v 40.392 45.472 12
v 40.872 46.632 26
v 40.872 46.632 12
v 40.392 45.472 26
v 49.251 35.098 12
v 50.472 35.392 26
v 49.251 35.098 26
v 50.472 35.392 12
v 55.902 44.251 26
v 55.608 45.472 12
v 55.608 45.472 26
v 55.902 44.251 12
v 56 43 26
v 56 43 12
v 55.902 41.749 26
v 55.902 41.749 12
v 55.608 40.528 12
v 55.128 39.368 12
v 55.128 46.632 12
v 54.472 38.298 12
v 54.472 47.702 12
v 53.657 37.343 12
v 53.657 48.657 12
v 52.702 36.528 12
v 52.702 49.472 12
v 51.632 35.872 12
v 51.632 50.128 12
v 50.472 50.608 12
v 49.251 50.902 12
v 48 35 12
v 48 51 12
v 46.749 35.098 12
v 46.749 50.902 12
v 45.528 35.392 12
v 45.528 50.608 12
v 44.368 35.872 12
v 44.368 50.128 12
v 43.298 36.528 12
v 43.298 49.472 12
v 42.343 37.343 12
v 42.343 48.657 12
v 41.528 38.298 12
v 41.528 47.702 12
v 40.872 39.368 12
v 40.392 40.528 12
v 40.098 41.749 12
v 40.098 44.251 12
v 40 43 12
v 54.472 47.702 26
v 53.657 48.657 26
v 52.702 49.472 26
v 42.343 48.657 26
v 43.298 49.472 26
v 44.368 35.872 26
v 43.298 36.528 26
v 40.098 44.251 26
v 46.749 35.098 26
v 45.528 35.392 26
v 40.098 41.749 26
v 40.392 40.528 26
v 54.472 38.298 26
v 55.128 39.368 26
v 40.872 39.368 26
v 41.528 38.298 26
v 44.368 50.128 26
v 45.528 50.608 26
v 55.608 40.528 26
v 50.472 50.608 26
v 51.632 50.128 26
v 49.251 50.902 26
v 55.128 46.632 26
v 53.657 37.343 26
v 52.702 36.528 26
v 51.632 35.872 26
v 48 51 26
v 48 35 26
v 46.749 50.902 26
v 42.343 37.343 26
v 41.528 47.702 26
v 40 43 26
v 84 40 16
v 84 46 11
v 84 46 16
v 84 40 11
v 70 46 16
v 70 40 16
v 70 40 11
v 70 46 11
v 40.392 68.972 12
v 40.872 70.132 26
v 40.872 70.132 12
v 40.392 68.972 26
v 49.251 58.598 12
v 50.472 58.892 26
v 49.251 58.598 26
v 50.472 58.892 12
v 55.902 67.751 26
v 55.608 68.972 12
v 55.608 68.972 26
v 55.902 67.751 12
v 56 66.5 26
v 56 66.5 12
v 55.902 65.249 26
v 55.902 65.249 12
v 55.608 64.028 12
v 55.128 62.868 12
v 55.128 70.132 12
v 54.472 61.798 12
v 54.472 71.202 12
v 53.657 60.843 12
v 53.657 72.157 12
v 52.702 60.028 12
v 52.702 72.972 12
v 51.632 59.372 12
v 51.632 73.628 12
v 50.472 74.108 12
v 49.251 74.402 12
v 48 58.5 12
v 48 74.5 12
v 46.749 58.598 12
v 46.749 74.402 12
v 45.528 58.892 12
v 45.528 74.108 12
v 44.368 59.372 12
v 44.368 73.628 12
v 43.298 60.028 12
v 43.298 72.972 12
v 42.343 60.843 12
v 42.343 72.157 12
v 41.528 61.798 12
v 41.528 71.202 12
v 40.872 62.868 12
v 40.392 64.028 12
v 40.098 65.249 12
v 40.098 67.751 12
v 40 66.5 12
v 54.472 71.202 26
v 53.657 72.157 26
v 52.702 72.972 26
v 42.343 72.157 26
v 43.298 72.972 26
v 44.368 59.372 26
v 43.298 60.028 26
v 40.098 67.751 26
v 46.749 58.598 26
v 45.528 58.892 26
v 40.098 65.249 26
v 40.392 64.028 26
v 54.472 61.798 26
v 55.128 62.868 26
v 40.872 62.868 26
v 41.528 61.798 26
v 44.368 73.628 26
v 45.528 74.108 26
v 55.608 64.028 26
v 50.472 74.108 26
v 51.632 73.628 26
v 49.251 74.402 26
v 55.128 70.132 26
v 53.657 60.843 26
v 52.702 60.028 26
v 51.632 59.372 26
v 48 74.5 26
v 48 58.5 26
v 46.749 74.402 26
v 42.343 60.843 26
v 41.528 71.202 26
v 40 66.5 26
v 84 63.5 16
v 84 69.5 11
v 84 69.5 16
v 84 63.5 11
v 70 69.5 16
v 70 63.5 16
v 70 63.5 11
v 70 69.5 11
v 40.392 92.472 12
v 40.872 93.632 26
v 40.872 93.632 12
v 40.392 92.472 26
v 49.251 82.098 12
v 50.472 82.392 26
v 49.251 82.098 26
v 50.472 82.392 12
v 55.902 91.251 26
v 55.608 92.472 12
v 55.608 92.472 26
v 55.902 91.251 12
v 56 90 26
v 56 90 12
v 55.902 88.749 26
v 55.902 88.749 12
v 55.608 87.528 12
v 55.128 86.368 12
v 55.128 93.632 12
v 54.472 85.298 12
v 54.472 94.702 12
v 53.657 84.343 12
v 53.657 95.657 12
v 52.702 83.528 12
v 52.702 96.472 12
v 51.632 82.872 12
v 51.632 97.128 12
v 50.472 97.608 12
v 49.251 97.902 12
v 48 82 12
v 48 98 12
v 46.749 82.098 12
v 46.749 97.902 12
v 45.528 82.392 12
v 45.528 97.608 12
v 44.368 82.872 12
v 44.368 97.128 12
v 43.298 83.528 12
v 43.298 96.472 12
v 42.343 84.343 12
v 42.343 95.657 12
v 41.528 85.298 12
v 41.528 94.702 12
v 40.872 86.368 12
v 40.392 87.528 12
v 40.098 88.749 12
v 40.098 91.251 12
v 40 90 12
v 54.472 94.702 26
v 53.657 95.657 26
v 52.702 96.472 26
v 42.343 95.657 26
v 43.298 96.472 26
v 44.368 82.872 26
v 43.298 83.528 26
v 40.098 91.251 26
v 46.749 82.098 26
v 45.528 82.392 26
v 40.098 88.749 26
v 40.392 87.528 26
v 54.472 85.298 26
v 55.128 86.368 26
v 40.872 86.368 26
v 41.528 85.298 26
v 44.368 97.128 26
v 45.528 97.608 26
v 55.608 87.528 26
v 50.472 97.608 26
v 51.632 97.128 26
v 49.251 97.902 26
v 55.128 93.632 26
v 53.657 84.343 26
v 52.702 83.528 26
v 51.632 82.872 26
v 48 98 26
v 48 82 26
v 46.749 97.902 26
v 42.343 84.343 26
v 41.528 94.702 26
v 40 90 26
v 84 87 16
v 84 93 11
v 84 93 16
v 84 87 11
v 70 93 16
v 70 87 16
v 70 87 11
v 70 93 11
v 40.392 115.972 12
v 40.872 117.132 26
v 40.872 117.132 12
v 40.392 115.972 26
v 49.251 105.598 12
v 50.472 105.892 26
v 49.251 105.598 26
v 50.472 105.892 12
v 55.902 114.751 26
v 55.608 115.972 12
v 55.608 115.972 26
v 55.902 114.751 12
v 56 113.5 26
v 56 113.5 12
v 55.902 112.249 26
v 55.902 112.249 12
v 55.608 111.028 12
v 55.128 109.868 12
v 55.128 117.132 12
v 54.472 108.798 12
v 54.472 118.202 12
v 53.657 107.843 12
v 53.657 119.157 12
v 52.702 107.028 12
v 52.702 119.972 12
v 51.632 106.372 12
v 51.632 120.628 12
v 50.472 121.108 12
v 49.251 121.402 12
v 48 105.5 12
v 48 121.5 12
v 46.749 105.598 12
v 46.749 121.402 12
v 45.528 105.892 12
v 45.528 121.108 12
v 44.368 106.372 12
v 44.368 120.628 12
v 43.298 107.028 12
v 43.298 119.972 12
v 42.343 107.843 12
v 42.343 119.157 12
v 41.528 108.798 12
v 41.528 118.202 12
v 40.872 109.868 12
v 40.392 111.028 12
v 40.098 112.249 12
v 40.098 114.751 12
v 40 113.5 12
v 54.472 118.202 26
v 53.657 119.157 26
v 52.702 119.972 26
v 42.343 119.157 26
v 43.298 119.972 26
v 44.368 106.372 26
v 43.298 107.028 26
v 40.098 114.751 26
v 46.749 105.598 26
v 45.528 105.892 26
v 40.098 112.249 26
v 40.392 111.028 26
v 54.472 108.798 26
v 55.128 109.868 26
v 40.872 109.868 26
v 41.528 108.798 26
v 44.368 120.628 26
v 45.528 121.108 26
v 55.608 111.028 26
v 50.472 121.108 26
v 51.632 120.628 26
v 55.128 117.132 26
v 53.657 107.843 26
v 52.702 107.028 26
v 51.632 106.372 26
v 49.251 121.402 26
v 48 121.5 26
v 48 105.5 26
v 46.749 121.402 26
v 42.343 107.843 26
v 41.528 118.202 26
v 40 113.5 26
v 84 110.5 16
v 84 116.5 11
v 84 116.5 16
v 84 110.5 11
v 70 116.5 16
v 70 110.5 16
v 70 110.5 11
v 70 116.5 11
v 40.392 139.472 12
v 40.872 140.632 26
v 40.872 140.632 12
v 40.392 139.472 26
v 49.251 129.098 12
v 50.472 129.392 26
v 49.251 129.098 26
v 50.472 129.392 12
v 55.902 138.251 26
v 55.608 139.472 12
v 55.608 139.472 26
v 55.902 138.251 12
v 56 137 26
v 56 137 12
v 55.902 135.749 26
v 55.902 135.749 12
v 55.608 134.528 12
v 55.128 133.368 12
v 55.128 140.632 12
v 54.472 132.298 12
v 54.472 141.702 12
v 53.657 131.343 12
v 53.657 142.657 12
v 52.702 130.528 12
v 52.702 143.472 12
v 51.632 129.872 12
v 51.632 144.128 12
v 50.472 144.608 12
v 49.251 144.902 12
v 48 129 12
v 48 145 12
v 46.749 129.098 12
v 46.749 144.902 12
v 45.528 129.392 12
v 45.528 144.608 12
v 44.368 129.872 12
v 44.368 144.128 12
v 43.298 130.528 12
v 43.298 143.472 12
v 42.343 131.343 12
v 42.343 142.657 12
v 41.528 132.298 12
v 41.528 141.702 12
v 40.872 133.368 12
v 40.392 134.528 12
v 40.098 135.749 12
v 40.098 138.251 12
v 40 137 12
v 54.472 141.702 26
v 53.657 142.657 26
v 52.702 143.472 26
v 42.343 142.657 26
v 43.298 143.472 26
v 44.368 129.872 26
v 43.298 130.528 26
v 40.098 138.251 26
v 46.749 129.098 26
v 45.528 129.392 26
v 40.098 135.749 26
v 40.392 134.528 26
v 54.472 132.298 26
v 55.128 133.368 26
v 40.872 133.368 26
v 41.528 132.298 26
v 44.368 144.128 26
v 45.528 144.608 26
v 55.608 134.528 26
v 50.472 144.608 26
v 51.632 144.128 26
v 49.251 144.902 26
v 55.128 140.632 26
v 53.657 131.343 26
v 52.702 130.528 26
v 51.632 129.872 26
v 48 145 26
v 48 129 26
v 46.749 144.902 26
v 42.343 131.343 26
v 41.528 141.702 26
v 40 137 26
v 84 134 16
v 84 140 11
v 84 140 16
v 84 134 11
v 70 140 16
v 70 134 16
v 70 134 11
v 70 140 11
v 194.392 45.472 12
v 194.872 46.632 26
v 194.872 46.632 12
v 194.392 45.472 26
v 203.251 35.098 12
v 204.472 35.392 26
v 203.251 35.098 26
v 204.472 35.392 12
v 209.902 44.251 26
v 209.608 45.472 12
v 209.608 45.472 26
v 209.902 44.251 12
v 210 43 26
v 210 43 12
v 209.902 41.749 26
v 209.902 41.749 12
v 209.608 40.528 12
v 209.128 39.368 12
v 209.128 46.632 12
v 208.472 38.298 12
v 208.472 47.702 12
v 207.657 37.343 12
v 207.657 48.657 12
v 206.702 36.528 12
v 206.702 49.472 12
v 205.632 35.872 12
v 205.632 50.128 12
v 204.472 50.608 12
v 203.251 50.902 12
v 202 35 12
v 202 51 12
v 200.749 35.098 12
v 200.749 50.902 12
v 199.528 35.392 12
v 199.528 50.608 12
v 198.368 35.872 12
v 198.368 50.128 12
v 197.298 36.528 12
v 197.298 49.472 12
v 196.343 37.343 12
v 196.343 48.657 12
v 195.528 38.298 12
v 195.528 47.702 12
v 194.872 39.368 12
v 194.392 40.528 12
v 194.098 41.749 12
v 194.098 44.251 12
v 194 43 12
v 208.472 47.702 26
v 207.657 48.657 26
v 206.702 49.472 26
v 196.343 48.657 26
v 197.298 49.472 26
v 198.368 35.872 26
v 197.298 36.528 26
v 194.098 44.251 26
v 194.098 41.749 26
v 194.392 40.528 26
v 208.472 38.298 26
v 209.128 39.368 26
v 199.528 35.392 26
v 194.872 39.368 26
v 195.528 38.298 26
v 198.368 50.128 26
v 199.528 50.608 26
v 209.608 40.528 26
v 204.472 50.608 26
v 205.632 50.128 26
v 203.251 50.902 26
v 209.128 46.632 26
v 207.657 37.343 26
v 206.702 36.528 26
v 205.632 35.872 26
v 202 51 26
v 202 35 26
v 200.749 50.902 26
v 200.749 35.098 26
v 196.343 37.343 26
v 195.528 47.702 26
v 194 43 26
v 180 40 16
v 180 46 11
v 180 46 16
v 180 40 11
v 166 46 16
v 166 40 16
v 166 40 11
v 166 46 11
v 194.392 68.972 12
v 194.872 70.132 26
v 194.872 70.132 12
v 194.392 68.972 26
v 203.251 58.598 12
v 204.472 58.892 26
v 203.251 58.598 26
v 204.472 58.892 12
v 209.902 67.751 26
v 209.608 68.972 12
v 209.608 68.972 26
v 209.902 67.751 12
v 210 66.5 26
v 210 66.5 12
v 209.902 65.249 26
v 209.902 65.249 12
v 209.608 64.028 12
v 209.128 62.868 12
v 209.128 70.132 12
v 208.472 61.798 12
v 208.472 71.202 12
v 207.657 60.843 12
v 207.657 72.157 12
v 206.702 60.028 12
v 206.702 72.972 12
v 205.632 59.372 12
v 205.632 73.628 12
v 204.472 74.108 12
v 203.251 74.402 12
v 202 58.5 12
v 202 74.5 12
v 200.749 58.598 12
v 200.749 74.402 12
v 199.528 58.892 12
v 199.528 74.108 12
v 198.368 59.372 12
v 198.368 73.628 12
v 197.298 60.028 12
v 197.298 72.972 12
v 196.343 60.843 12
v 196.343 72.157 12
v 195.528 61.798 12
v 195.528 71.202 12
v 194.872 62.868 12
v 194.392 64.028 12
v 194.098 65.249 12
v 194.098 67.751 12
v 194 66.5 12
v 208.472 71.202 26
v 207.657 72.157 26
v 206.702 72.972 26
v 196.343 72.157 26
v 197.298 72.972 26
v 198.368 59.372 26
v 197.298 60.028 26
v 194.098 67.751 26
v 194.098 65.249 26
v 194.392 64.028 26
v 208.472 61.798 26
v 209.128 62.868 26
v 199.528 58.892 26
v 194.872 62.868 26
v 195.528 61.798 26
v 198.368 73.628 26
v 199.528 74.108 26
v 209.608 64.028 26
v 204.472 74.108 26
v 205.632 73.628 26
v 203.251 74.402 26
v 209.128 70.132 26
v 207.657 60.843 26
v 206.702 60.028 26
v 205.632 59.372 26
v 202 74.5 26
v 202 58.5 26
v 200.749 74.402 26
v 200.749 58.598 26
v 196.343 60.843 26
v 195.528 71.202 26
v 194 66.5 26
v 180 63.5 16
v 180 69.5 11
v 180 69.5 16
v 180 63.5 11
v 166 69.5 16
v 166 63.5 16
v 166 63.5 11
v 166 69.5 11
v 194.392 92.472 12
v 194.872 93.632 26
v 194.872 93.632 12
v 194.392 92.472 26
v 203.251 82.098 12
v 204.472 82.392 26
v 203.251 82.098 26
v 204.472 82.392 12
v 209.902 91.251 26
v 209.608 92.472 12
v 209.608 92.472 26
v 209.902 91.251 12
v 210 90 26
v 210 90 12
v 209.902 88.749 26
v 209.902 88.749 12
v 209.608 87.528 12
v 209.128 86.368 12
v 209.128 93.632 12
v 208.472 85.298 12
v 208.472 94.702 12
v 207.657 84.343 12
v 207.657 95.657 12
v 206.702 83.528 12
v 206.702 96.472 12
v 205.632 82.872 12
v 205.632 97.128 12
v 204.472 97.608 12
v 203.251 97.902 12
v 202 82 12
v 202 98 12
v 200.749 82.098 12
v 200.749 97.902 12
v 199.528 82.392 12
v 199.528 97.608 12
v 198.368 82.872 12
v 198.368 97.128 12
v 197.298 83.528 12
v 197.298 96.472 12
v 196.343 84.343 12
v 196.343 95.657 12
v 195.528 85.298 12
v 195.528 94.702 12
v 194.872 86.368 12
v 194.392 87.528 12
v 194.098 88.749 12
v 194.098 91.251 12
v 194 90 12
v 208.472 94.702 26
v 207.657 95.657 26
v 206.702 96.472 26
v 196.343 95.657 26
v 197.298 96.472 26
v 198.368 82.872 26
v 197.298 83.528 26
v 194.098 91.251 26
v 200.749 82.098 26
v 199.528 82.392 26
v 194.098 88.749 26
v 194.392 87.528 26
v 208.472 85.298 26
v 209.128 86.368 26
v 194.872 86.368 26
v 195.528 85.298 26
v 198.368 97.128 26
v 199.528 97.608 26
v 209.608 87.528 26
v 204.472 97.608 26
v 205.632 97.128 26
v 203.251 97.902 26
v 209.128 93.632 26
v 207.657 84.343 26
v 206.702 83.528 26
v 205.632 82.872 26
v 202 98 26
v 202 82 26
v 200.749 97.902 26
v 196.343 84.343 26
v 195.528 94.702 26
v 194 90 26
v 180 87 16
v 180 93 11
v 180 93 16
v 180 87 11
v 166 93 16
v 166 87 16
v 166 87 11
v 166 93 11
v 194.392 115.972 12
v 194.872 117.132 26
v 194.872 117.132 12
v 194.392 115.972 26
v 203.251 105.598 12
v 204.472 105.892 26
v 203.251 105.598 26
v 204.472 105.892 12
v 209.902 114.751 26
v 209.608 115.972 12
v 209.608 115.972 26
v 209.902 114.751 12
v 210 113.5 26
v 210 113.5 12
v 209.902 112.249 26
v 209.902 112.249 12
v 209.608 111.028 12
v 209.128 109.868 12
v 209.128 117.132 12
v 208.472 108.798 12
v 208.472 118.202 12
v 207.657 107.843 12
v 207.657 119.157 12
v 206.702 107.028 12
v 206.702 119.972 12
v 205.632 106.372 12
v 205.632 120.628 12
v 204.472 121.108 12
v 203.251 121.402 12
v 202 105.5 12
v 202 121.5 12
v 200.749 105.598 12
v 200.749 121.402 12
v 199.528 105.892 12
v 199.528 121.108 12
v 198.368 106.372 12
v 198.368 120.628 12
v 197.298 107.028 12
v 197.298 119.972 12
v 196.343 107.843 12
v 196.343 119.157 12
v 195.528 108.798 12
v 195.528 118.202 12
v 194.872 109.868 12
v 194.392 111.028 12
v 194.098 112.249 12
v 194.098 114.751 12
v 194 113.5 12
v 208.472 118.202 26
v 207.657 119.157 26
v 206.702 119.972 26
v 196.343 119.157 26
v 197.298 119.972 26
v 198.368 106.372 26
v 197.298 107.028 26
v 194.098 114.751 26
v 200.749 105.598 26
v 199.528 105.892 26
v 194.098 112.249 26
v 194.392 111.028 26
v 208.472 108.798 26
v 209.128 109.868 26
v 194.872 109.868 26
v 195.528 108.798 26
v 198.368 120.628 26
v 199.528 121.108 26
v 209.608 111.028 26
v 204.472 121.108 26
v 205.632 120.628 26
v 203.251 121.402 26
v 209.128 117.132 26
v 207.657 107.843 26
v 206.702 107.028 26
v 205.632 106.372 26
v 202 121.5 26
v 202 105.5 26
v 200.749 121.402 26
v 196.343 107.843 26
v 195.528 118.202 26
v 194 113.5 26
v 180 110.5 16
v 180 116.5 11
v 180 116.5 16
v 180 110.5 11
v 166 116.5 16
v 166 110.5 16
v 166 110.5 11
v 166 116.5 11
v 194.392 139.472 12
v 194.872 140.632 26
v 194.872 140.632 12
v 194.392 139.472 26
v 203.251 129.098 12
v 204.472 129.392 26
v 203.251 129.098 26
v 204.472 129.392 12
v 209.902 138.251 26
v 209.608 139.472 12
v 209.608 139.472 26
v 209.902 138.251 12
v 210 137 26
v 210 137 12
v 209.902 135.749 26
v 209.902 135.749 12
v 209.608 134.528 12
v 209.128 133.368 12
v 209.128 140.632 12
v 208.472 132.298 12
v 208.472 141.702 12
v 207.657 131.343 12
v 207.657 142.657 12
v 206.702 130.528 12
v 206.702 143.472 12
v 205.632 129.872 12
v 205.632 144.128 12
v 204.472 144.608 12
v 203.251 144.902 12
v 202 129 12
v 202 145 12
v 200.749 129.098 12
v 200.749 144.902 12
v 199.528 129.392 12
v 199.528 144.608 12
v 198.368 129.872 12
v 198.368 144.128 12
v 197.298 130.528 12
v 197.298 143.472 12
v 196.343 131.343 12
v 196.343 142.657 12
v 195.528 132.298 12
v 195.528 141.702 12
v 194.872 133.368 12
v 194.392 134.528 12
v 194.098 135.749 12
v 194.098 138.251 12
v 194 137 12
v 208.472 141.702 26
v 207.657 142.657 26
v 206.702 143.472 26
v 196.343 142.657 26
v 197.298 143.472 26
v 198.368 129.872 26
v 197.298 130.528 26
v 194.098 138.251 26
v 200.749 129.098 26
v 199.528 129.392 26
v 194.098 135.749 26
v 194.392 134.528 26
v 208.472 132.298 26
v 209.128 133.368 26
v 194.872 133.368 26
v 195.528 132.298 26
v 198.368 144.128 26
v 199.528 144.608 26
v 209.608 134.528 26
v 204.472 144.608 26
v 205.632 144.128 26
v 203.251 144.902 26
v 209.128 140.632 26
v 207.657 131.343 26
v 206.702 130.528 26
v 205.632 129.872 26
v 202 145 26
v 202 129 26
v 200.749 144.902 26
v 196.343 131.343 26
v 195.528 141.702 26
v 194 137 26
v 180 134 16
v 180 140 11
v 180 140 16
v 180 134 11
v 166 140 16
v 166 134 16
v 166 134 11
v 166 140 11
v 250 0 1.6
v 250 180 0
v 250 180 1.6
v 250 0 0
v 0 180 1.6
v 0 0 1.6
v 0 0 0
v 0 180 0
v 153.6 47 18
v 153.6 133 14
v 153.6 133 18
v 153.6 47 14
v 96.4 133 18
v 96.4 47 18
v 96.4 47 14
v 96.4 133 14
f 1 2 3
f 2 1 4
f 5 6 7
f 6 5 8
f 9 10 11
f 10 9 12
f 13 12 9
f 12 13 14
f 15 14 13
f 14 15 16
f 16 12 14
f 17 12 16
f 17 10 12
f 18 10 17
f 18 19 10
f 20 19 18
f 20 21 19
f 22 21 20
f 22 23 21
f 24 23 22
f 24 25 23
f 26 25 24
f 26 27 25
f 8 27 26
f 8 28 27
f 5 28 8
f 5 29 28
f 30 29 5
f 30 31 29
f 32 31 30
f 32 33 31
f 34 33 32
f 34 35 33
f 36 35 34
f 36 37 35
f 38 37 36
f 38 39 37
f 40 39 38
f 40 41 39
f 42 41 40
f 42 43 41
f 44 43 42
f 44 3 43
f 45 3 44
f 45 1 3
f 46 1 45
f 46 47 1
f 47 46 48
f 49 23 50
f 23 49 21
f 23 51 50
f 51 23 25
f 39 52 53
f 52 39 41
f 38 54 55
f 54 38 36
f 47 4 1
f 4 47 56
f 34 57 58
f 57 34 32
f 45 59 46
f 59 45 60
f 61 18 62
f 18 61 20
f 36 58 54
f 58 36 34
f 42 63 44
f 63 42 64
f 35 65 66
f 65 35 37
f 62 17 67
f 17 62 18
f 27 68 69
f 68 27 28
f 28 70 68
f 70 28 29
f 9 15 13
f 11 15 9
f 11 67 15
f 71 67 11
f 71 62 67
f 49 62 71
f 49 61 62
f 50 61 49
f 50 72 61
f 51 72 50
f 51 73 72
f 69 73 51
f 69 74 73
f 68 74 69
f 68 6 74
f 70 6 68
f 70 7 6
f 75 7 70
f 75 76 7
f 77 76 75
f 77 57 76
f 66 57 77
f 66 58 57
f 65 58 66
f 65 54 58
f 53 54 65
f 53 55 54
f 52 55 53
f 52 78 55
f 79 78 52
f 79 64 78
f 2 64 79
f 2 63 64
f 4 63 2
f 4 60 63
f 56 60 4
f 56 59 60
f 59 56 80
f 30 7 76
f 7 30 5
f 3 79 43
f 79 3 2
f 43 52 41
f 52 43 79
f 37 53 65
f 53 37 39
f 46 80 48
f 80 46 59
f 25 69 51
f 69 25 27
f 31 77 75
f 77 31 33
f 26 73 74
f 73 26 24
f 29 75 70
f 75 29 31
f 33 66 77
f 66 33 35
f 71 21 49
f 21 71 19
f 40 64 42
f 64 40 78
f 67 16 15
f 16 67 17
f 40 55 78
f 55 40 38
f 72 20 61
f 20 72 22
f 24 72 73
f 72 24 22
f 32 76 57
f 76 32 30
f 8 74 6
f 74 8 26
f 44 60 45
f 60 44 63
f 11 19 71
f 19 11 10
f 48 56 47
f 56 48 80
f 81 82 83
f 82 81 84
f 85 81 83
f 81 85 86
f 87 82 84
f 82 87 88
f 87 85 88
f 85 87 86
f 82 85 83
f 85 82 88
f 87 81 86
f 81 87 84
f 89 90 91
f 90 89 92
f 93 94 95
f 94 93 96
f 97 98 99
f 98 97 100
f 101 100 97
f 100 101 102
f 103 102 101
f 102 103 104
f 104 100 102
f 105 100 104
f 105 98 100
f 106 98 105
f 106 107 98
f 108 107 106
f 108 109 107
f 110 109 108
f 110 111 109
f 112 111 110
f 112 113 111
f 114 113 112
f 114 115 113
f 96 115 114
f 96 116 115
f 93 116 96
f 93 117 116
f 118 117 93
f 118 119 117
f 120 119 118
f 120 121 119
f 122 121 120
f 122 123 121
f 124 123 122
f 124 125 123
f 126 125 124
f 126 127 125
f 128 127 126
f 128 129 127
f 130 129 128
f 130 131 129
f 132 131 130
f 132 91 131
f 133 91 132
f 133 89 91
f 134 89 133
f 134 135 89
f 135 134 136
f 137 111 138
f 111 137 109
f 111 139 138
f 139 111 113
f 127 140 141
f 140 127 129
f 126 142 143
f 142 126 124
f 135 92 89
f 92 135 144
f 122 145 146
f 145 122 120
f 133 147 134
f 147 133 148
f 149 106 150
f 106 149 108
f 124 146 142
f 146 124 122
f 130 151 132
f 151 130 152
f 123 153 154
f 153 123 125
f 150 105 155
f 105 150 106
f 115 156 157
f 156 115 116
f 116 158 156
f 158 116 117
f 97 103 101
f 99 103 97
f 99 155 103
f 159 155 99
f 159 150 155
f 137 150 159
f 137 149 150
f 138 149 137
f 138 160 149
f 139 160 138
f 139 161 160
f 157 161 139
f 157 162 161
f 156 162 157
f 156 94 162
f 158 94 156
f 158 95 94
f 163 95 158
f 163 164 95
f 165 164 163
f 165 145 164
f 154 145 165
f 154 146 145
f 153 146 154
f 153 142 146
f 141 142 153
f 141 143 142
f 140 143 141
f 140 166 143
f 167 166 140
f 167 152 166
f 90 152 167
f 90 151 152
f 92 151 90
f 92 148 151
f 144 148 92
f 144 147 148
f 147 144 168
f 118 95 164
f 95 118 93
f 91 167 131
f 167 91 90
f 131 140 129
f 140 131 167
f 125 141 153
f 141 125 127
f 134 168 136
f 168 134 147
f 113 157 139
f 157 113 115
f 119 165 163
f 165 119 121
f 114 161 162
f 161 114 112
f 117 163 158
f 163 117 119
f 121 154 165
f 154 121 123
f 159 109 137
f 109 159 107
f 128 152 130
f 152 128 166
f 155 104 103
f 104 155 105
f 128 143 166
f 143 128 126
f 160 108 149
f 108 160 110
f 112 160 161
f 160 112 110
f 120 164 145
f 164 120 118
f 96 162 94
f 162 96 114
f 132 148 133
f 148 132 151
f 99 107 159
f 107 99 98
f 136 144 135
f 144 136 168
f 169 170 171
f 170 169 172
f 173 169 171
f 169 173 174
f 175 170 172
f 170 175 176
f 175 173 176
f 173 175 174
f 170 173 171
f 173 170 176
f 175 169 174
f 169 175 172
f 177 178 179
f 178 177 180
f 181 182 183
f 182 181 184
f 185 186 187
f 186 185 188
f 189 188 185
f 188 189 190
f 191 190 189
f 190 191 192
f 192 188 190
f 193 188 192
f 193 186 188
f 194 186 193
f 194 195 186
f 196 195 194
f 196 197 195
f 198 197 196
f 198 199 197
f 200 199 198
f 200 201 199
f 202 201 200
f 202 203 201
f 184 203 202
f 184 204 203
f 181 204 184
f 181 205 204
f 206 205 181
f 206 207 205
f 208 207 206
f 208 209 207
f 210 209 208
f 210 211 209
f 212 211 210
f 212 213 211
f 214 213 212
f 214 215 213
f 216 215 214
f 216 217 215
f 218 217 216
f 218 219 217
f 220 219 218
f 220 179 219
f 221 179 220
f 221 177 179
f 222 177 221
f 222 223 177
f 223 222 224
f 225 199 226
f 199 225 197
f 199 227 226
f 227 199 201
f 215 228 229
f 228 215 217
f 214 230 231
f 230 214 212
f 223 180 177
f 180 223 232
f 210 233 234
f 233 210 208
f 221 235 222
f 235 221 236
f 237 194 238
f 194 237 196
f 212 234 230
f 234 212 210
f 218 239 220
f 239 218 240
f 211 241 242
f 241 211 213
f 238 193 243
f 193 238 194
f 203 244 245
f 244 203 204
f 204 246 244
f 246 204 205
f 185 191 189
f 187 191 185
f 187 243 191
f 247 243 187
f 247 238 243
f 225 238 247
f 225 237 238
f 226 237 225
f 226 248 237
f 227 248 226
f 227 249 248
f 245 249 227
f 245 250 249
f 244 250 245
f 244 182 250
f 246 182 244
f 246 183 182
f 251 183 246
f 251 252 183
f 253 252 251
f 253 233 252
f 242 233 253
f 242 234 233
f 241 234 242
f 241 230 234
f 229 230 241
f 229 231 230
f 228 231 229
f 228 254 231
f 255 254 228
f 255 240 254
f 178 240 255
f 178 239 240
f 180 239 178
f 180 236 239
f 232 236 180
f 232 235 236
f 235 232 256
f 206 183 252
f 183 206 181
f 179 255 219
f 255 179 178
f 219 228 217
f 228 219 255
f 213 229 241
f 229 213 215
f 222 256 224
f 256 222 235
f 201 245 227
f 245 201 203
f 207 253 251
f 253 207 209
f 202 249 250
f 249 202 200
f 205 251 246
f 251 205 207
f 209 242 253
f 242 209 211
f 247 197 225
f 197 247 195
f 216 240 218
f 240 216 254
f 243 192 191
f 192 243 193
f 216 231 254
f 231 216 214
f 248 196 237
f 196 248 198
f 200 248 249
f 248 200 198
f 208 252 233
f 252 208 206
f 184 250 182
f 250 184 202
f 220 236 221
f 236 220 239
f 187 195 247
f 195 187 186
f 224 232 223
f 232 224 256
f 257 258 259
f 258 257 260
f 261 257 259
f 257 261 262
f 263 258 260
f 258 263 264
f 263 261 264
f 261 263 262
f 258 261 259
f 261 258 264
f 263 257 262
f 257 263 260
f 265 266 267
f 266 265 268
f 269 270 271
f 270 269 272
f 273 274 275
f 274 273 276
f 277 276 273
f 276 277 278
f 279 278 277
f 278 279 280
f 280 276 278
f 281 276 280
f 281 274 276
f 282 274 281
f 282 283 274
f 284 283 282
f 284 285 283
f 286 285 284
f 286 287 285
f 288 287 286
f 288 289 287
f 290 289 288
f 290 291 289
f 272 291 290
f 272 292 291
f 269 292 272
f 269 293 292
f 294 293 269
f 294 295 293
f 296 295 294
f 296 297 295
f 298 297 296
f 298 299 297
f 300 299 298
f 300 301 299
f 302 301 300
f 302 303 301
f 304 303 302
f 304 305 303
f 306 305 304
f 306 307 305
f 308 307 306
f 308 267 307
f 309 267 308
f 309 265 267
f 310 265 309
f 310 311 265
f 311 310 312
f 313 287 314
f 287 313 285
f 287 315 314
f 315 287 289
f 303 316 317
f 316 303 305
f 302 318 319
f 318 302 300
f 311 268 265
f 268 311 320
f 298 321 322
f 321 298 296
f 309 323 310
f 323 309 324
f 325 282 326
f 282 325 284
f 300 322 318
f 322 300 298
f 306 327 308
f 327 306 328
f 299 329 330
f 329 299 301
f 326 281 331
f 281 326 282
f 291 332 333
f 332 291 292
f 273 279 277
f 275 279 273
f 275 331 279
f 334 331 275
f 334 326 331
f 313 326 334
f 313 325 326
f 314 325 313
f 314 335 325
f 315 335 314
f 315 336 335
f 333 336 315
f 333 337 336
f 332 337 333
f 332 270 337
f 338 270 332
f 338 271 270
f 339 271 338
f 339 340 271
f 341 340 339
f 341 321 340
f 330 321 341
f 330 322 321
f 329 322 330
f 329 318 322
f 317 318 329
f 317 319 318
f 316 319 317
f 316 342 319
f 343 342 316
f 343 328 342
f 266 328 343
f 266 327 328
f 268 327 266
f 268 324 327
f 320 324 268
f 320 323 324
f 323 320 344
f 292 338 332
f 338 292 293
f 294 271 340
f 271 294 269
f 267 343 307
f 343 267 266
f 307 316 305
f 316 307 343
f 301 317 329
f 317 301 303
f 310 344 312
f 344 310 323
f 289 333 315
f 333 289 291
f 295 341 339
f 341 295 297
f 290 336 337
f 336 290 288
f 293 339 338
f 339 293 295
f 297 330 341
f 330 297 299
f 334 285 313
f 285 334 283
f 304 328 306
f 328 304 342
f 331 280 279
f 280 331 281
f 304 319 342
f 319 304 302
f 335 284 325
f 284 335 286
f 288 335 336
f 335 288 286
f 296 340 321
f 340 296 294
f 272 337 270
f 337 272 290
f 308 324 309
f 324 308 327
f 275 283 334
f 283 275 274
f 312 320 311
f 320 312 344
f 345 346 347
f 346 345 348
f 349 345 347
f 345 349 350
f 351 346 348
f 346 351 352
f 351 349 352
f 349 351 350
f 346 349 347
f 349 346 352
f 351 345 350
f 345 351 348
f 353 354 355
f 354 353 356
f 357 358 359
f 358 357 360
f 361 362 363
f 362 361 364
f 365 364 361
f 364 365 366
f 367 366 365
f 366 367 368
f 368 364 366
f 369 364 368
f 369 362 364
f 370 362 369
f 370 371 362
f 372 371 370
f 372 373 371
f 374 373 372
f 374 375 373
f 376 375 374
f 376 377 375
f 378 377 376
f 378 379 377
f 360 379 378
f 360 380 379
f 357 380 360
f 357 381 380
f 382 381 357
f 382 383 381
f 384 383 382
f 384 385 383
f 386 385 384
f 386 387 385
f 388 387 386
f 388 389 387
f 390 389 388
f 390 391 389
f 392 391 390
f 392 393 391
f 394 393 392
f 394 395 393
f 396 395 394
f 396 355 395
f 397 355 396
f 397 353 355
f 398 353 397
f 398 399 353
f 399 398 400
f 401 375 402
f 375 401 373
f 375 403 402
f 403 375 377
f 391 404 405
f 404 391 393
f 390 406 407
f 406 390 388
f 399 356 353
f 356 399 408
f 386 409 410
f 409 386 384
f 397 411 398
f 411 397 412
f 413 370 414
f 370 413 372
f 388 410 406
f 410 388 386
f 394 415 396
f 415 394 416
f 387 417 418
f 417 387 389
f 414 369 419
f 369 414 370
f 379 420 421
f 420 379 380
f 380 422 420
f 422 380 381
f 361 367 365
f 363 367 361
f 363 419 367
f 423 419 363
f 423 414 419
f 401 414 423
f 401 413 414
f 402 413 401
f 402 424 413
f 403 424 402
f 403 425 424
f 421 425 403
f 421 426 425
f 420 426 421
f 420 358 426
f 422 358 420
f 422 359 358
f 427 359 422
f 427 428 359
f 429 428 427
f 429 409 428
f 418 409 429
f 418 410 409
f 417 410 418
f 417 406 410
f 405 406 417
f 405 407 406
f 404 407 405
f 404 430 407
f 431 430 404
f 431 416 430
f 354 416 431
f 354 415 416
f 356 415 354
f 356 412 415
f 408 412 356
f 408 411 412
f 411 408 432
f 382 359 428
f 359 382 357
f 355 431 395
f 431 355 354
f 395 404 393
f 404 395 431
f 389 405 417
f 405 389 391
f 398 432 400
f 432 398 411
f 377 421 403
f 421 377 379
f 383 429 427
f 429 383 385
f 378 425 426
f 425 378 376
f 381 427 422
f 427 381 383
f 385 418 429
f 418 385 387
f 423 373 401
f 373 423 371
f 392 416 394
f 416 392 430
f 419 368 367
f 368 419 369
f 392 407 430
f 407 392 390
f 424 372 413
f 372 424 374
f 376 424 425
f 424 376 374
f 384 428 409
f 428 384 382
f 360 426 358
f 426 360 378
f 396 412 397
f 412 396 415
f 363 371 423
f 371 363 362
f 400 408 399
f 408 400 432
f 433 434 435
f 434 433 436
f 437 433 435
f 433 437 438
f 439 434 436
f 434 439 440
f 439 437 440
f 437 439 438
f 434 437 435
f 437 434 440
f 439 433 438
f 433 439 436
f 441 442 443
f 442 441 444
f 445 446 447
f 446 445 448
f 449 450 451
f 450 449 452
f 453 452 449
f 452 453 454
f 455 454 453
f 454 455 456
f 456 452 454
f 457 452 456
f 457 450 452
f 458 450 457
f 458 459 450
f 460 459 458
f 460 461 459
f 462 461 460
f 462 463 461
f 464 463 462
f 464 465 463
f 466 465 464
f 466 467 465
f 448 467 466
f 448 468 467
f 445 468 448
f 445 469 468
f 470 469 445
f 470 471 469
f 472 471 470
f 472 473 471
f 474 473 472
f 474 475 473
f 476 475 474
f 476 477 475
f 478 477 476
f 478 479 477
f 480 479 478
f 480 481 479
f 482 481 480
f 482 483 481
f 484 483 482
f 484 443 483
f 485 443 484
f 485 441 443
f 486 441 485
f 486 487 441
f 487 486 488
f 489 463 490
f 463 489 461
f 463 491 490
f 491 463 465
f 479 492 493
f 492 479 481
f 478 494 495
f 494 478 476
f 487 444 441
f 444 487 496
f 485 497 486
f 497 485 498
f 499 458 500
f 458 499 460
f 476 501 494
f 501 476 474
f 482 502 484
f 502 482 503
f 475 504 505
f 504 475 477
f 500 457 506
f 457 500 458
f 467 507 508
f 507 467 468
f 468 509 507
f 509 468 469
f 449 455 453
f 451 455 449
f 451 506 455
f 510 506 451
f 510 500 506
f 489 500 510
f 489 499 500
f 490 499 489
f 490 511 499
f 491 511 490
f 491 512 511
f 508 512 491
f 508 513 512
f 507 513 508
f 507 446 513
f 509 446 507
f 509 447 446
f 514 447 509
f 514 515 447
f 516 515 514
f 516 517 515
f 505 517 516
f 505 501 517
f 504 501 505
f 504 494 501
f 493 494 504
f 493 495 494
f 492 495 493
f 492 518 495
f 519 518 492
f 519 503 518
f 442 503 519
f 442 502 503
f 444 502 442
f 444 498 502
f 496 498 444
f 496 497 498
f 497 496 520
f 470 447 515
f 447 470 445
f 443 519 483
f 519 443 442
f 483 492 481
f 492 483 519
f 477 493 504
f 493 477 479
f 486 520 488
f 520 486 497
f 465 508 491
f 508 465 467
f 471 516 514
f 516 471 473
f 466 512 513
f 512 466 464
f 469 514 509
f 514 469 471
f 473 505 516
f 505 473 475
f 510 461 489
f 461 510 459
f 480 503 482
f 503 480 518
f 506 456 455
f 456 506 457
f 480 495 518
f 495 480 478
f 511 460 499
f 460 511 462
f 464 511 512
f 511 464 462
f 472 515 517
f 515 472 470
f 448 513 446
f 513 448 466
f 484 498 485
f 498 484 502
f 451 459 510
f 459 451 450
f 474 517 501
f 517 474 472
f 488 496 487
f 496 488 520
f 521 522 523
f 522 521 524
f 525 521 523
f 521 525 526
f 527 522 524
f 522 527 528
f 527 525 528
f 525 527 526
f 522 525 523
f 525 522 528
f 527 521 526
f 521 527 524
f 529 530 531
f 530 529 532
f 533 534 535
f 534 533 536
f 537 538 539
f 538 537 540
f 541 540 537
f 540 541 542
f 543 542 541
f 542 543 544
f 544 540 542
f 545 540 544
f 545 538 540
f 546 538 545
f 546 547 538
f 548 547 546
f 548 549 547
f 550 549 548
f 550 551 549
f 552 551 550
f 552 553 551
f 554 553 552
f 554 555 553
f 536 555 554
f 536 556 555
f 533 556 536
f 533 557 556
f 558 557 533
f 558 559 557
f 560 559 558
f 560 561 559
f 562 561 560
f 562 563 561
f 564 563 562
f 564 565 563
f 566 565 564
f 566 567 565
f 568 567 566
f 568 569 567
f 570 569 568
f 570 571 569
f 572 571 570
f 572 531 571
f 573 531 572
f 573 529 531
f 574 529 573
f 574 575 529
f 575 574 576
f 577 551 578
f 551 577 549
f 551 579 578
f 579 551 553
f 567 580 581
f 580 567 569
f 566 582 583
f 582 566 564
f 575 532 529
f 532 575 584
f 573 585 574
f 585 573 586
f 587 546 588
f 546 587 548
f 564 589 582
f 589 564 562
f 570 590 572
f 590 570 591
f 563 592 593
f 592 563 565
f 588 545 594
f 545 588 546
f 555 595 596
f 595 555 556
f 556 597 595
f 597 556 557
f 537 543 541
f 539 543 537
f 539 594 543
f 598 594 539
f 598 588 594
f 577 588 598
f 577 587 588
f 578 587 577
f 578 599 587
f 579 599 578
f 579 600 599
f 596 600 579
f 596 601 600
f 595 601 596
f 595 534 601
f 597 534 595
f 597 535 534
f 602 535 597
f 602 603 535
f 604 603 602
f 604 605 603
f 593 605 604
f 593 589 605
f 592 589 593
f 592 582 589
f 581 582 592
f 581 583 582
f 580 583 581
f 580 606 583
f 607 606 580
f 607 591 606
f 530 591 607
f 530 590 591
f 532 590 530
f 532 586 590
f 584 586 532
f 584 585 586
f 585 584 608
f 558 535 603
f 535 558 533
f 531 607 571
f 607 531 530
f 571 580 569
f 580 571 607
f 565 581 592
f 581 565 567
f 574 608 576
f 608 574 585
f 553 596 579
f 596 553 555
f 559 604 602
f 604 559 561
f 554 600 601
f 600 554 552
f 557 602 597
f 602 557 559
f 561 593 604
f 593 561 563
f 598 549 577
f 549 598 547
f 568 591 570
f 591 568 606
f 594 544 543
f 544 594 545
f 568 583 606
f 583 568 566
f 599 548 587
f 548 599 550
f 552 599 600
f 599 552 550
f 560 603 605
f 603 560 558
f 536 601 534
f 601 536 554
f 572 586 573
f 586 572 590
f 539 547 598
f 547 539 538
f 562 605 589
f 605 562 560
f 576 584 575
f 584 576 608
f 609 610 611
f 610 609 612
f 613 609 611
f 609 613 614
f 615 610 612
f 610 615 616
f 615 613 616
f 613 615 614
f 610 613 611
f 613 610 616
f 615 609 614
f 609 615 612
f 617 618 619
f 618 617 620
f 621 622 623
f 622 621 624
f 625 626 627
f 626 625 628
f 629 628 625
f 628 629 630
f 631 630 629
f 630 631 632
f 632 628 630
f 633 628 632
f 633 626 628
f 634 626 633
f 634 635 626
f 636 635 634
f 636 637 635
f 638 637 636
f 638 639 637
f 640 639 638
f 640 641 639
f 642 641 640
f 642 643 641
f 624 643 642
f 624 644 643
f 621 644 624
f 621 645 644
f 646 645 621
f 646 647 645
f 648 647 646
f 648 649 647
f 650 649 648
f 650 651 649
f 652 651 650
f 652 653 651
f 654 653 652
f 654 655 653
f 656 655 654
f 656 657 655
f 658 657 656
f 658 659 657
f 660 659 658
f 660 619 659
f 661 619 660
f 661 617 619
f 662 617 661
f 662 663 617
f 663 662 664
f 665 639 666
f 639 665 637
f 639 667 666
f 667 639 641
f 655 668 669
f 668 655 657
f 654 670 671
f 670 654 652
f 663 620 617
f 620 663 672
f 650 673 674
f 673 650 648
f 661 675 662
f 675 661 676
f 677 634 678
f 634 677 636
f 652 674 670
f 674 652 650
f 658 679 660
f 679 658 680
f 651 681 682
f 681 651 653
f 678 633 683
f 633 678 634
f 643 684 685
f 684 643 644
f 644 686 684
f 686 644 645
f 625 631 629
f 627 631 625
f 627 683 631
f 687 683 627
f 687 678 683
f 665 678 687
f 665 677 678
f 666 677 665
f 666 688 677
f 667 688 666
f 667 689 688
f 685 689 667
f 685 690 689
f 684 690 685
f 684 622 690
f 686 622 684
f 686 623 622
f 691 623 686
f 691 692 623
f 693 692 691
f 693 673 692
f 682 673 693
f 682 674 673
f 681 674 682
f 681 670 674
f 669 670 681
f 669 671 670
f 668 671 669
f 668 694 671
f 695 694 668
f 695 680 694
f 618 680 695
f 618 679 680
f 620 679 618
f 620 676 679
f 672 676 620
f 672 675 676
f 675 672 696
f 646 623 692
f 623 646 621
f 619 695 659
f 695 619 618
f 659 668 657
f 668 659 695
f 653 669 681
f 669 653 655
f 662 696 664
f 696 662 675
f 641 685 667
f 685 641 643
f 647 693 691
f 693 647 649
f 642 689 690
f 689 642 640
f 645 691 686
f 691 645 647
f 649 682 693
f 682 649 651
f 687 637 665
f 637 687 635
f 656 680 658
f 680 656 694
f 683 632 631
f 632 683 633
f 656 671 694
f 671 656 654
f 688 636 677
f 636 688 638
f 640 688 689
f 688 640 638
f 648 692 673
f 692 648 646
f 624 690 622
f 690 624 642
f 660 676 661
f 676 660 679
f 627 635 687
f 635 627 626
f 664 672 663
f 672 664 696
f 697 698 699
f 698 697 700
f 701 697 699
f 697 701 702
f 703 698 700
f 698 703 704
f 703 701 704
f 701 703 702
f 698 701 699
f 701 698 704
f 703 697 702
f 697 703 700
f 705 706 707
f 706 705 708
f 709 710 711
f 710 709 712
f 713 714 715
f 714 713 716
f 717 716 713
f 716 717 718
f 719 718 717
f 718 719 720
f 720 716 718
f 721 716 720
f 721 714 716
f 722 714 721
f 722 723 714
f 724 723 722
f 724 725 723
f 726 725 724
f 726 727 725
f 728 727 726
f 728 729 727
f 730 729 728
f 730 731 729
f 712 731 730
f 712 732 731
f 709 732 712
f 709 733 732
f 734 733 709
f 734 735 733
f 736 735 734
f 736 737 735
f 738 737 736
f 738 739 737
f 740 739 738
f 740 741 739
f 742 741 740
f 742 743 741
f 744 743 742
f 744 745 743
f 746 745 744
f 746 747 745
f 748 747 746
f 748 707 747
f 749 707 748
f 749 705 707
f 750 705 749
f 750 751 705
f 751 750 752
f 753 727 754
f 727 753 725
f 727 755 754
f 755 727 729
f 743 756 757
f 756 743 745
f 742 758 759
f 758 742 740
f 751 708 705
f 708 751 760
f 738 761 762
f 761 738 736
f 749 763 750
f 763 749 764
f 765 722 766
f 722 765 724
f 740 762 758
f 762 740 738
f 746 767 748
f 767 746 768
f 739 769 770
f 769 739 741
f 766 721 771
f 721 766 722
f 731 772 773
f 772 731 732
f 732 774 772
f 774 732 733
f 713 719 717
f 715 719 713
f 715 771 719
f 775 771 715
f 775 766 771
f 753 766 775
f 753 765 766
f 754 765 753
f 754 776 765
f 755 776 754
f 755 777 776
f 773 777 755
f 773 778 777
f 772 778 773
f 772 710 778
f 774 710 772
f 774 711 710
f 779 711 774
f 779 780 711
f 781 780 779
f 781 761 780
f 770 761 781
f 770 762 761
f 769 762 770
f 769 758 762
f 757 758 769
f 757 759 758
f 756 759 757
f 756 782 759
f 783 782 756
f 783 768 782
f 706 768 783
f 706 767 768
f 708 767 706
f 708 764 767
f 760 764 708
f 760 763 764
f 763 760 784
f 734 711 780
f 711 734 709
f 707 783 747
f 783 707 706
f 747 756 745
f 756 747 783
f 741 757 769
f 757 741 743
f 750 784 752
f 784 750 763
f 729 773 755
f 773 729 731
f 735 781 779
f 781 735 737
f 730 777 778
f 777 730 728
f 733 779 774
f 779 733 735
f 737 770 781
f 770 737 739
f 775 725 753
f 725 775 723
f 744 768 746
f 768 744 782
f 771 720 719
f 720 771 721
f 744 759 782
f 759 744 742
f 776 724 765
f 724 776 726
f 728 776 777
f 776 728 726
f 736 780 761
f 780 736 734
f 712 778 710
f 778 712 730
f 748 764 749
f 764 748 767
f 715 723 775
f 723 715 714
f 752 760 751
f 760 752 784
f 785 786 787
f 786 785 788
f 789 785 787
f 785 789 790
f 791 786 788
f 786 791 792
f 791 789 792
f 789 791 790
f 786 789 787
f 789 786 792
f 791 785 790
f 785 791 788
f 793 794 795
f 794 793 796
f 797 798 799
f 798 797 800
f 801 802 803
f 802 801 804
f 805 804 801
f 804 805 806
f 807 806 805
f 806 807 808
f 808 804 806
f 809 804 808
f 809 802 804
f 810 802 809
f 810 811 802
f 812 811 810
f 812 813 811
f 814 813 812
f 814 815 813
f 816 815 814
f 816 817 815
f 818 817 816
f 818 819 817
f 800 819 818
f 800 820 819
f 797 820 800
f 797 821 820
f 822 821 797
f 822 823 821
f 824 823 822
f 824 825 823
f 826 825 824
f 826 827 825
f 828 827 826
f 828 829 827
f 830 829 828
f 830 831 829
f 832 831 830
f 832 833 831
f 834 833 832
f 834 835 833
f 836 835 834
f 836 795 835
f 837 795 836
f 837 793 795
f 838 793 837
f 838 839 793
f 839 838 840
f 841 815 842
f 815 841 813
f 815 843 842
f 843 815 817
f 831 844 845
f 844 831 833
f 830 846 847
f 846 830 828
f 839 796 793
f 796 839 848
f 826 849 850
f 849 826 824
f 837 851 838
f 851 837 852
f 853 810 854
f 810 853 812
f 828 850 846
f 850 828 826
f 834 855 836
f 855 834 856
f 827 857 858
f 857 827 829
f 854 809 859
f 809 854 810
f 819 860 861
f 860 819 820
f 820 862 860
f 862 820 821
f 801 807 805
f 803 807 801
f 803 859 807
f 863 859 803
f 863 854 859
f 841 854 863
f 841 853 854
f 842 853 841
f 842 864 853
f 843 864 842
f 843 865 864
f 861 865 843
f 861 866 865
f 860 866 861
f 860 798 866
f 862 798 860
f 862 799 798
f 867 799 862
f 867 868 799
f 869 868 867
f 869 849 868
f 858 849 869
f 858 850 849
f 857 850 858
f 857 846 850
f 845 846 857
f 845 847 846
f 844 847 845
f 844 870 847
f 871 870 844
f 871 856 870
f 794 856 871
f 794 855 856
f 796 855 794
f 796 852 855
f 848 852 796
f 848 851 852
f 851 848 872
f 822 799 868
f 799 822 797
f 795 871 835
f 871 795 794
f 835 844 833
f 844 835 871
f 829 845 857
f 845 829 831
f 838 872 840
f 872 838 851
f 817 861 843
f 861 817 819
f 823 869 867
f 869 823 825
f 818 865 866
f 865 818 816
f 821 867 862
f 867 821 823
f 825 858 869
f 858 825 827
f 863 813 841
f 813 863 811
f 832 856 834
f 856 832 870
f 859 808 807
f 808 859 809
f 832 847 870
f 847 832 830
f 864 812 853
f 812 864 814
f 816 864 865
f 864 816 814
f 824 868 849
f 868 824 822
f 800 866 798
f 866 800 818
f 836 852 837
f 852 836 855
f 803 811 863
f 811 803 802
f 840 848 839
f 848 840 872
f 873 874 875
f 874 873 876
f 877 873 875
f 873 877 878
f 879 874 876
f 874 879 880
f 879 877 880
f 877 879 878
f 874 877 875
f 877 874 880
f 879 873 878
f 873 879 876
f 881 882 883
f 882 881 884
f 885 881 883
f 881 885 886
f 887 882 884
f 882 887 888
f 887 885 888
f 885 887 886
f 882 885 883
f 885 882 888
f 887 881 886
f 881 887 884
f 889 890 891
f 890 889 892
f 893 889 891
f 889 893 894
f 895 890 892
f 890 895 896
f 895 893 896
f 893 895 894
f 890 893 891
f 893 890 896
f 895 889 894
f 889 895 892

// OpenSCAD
// Nominal ergonomic envelopes only. NOT exact parts, a routed PCB or drill drawing.
// Units mm. No holes are cut because final module/shaft/pad geometry is unqualified.
$fn=40;
color([0.3,0.4,0.4]) cube([250,180,1.6]);
color([0.15,0.2,0.2]) translate([96.4,47,14])cube([57.2,86,4]);
for(side=[0:1])for(row=[0:4]){
  x=side==0?48:202; y=43+row*23.5;
  color([0.25,0.25,0.25]) translate([x,y,12]) cylinder(h=14,r=8);
  color([0.55,0.55,0.55]) translate([side==0?70:166,y-3,11])cube([14,6,5]);
}
// The actual pot manufacturer STEP remains under reference/assets/pot/.
